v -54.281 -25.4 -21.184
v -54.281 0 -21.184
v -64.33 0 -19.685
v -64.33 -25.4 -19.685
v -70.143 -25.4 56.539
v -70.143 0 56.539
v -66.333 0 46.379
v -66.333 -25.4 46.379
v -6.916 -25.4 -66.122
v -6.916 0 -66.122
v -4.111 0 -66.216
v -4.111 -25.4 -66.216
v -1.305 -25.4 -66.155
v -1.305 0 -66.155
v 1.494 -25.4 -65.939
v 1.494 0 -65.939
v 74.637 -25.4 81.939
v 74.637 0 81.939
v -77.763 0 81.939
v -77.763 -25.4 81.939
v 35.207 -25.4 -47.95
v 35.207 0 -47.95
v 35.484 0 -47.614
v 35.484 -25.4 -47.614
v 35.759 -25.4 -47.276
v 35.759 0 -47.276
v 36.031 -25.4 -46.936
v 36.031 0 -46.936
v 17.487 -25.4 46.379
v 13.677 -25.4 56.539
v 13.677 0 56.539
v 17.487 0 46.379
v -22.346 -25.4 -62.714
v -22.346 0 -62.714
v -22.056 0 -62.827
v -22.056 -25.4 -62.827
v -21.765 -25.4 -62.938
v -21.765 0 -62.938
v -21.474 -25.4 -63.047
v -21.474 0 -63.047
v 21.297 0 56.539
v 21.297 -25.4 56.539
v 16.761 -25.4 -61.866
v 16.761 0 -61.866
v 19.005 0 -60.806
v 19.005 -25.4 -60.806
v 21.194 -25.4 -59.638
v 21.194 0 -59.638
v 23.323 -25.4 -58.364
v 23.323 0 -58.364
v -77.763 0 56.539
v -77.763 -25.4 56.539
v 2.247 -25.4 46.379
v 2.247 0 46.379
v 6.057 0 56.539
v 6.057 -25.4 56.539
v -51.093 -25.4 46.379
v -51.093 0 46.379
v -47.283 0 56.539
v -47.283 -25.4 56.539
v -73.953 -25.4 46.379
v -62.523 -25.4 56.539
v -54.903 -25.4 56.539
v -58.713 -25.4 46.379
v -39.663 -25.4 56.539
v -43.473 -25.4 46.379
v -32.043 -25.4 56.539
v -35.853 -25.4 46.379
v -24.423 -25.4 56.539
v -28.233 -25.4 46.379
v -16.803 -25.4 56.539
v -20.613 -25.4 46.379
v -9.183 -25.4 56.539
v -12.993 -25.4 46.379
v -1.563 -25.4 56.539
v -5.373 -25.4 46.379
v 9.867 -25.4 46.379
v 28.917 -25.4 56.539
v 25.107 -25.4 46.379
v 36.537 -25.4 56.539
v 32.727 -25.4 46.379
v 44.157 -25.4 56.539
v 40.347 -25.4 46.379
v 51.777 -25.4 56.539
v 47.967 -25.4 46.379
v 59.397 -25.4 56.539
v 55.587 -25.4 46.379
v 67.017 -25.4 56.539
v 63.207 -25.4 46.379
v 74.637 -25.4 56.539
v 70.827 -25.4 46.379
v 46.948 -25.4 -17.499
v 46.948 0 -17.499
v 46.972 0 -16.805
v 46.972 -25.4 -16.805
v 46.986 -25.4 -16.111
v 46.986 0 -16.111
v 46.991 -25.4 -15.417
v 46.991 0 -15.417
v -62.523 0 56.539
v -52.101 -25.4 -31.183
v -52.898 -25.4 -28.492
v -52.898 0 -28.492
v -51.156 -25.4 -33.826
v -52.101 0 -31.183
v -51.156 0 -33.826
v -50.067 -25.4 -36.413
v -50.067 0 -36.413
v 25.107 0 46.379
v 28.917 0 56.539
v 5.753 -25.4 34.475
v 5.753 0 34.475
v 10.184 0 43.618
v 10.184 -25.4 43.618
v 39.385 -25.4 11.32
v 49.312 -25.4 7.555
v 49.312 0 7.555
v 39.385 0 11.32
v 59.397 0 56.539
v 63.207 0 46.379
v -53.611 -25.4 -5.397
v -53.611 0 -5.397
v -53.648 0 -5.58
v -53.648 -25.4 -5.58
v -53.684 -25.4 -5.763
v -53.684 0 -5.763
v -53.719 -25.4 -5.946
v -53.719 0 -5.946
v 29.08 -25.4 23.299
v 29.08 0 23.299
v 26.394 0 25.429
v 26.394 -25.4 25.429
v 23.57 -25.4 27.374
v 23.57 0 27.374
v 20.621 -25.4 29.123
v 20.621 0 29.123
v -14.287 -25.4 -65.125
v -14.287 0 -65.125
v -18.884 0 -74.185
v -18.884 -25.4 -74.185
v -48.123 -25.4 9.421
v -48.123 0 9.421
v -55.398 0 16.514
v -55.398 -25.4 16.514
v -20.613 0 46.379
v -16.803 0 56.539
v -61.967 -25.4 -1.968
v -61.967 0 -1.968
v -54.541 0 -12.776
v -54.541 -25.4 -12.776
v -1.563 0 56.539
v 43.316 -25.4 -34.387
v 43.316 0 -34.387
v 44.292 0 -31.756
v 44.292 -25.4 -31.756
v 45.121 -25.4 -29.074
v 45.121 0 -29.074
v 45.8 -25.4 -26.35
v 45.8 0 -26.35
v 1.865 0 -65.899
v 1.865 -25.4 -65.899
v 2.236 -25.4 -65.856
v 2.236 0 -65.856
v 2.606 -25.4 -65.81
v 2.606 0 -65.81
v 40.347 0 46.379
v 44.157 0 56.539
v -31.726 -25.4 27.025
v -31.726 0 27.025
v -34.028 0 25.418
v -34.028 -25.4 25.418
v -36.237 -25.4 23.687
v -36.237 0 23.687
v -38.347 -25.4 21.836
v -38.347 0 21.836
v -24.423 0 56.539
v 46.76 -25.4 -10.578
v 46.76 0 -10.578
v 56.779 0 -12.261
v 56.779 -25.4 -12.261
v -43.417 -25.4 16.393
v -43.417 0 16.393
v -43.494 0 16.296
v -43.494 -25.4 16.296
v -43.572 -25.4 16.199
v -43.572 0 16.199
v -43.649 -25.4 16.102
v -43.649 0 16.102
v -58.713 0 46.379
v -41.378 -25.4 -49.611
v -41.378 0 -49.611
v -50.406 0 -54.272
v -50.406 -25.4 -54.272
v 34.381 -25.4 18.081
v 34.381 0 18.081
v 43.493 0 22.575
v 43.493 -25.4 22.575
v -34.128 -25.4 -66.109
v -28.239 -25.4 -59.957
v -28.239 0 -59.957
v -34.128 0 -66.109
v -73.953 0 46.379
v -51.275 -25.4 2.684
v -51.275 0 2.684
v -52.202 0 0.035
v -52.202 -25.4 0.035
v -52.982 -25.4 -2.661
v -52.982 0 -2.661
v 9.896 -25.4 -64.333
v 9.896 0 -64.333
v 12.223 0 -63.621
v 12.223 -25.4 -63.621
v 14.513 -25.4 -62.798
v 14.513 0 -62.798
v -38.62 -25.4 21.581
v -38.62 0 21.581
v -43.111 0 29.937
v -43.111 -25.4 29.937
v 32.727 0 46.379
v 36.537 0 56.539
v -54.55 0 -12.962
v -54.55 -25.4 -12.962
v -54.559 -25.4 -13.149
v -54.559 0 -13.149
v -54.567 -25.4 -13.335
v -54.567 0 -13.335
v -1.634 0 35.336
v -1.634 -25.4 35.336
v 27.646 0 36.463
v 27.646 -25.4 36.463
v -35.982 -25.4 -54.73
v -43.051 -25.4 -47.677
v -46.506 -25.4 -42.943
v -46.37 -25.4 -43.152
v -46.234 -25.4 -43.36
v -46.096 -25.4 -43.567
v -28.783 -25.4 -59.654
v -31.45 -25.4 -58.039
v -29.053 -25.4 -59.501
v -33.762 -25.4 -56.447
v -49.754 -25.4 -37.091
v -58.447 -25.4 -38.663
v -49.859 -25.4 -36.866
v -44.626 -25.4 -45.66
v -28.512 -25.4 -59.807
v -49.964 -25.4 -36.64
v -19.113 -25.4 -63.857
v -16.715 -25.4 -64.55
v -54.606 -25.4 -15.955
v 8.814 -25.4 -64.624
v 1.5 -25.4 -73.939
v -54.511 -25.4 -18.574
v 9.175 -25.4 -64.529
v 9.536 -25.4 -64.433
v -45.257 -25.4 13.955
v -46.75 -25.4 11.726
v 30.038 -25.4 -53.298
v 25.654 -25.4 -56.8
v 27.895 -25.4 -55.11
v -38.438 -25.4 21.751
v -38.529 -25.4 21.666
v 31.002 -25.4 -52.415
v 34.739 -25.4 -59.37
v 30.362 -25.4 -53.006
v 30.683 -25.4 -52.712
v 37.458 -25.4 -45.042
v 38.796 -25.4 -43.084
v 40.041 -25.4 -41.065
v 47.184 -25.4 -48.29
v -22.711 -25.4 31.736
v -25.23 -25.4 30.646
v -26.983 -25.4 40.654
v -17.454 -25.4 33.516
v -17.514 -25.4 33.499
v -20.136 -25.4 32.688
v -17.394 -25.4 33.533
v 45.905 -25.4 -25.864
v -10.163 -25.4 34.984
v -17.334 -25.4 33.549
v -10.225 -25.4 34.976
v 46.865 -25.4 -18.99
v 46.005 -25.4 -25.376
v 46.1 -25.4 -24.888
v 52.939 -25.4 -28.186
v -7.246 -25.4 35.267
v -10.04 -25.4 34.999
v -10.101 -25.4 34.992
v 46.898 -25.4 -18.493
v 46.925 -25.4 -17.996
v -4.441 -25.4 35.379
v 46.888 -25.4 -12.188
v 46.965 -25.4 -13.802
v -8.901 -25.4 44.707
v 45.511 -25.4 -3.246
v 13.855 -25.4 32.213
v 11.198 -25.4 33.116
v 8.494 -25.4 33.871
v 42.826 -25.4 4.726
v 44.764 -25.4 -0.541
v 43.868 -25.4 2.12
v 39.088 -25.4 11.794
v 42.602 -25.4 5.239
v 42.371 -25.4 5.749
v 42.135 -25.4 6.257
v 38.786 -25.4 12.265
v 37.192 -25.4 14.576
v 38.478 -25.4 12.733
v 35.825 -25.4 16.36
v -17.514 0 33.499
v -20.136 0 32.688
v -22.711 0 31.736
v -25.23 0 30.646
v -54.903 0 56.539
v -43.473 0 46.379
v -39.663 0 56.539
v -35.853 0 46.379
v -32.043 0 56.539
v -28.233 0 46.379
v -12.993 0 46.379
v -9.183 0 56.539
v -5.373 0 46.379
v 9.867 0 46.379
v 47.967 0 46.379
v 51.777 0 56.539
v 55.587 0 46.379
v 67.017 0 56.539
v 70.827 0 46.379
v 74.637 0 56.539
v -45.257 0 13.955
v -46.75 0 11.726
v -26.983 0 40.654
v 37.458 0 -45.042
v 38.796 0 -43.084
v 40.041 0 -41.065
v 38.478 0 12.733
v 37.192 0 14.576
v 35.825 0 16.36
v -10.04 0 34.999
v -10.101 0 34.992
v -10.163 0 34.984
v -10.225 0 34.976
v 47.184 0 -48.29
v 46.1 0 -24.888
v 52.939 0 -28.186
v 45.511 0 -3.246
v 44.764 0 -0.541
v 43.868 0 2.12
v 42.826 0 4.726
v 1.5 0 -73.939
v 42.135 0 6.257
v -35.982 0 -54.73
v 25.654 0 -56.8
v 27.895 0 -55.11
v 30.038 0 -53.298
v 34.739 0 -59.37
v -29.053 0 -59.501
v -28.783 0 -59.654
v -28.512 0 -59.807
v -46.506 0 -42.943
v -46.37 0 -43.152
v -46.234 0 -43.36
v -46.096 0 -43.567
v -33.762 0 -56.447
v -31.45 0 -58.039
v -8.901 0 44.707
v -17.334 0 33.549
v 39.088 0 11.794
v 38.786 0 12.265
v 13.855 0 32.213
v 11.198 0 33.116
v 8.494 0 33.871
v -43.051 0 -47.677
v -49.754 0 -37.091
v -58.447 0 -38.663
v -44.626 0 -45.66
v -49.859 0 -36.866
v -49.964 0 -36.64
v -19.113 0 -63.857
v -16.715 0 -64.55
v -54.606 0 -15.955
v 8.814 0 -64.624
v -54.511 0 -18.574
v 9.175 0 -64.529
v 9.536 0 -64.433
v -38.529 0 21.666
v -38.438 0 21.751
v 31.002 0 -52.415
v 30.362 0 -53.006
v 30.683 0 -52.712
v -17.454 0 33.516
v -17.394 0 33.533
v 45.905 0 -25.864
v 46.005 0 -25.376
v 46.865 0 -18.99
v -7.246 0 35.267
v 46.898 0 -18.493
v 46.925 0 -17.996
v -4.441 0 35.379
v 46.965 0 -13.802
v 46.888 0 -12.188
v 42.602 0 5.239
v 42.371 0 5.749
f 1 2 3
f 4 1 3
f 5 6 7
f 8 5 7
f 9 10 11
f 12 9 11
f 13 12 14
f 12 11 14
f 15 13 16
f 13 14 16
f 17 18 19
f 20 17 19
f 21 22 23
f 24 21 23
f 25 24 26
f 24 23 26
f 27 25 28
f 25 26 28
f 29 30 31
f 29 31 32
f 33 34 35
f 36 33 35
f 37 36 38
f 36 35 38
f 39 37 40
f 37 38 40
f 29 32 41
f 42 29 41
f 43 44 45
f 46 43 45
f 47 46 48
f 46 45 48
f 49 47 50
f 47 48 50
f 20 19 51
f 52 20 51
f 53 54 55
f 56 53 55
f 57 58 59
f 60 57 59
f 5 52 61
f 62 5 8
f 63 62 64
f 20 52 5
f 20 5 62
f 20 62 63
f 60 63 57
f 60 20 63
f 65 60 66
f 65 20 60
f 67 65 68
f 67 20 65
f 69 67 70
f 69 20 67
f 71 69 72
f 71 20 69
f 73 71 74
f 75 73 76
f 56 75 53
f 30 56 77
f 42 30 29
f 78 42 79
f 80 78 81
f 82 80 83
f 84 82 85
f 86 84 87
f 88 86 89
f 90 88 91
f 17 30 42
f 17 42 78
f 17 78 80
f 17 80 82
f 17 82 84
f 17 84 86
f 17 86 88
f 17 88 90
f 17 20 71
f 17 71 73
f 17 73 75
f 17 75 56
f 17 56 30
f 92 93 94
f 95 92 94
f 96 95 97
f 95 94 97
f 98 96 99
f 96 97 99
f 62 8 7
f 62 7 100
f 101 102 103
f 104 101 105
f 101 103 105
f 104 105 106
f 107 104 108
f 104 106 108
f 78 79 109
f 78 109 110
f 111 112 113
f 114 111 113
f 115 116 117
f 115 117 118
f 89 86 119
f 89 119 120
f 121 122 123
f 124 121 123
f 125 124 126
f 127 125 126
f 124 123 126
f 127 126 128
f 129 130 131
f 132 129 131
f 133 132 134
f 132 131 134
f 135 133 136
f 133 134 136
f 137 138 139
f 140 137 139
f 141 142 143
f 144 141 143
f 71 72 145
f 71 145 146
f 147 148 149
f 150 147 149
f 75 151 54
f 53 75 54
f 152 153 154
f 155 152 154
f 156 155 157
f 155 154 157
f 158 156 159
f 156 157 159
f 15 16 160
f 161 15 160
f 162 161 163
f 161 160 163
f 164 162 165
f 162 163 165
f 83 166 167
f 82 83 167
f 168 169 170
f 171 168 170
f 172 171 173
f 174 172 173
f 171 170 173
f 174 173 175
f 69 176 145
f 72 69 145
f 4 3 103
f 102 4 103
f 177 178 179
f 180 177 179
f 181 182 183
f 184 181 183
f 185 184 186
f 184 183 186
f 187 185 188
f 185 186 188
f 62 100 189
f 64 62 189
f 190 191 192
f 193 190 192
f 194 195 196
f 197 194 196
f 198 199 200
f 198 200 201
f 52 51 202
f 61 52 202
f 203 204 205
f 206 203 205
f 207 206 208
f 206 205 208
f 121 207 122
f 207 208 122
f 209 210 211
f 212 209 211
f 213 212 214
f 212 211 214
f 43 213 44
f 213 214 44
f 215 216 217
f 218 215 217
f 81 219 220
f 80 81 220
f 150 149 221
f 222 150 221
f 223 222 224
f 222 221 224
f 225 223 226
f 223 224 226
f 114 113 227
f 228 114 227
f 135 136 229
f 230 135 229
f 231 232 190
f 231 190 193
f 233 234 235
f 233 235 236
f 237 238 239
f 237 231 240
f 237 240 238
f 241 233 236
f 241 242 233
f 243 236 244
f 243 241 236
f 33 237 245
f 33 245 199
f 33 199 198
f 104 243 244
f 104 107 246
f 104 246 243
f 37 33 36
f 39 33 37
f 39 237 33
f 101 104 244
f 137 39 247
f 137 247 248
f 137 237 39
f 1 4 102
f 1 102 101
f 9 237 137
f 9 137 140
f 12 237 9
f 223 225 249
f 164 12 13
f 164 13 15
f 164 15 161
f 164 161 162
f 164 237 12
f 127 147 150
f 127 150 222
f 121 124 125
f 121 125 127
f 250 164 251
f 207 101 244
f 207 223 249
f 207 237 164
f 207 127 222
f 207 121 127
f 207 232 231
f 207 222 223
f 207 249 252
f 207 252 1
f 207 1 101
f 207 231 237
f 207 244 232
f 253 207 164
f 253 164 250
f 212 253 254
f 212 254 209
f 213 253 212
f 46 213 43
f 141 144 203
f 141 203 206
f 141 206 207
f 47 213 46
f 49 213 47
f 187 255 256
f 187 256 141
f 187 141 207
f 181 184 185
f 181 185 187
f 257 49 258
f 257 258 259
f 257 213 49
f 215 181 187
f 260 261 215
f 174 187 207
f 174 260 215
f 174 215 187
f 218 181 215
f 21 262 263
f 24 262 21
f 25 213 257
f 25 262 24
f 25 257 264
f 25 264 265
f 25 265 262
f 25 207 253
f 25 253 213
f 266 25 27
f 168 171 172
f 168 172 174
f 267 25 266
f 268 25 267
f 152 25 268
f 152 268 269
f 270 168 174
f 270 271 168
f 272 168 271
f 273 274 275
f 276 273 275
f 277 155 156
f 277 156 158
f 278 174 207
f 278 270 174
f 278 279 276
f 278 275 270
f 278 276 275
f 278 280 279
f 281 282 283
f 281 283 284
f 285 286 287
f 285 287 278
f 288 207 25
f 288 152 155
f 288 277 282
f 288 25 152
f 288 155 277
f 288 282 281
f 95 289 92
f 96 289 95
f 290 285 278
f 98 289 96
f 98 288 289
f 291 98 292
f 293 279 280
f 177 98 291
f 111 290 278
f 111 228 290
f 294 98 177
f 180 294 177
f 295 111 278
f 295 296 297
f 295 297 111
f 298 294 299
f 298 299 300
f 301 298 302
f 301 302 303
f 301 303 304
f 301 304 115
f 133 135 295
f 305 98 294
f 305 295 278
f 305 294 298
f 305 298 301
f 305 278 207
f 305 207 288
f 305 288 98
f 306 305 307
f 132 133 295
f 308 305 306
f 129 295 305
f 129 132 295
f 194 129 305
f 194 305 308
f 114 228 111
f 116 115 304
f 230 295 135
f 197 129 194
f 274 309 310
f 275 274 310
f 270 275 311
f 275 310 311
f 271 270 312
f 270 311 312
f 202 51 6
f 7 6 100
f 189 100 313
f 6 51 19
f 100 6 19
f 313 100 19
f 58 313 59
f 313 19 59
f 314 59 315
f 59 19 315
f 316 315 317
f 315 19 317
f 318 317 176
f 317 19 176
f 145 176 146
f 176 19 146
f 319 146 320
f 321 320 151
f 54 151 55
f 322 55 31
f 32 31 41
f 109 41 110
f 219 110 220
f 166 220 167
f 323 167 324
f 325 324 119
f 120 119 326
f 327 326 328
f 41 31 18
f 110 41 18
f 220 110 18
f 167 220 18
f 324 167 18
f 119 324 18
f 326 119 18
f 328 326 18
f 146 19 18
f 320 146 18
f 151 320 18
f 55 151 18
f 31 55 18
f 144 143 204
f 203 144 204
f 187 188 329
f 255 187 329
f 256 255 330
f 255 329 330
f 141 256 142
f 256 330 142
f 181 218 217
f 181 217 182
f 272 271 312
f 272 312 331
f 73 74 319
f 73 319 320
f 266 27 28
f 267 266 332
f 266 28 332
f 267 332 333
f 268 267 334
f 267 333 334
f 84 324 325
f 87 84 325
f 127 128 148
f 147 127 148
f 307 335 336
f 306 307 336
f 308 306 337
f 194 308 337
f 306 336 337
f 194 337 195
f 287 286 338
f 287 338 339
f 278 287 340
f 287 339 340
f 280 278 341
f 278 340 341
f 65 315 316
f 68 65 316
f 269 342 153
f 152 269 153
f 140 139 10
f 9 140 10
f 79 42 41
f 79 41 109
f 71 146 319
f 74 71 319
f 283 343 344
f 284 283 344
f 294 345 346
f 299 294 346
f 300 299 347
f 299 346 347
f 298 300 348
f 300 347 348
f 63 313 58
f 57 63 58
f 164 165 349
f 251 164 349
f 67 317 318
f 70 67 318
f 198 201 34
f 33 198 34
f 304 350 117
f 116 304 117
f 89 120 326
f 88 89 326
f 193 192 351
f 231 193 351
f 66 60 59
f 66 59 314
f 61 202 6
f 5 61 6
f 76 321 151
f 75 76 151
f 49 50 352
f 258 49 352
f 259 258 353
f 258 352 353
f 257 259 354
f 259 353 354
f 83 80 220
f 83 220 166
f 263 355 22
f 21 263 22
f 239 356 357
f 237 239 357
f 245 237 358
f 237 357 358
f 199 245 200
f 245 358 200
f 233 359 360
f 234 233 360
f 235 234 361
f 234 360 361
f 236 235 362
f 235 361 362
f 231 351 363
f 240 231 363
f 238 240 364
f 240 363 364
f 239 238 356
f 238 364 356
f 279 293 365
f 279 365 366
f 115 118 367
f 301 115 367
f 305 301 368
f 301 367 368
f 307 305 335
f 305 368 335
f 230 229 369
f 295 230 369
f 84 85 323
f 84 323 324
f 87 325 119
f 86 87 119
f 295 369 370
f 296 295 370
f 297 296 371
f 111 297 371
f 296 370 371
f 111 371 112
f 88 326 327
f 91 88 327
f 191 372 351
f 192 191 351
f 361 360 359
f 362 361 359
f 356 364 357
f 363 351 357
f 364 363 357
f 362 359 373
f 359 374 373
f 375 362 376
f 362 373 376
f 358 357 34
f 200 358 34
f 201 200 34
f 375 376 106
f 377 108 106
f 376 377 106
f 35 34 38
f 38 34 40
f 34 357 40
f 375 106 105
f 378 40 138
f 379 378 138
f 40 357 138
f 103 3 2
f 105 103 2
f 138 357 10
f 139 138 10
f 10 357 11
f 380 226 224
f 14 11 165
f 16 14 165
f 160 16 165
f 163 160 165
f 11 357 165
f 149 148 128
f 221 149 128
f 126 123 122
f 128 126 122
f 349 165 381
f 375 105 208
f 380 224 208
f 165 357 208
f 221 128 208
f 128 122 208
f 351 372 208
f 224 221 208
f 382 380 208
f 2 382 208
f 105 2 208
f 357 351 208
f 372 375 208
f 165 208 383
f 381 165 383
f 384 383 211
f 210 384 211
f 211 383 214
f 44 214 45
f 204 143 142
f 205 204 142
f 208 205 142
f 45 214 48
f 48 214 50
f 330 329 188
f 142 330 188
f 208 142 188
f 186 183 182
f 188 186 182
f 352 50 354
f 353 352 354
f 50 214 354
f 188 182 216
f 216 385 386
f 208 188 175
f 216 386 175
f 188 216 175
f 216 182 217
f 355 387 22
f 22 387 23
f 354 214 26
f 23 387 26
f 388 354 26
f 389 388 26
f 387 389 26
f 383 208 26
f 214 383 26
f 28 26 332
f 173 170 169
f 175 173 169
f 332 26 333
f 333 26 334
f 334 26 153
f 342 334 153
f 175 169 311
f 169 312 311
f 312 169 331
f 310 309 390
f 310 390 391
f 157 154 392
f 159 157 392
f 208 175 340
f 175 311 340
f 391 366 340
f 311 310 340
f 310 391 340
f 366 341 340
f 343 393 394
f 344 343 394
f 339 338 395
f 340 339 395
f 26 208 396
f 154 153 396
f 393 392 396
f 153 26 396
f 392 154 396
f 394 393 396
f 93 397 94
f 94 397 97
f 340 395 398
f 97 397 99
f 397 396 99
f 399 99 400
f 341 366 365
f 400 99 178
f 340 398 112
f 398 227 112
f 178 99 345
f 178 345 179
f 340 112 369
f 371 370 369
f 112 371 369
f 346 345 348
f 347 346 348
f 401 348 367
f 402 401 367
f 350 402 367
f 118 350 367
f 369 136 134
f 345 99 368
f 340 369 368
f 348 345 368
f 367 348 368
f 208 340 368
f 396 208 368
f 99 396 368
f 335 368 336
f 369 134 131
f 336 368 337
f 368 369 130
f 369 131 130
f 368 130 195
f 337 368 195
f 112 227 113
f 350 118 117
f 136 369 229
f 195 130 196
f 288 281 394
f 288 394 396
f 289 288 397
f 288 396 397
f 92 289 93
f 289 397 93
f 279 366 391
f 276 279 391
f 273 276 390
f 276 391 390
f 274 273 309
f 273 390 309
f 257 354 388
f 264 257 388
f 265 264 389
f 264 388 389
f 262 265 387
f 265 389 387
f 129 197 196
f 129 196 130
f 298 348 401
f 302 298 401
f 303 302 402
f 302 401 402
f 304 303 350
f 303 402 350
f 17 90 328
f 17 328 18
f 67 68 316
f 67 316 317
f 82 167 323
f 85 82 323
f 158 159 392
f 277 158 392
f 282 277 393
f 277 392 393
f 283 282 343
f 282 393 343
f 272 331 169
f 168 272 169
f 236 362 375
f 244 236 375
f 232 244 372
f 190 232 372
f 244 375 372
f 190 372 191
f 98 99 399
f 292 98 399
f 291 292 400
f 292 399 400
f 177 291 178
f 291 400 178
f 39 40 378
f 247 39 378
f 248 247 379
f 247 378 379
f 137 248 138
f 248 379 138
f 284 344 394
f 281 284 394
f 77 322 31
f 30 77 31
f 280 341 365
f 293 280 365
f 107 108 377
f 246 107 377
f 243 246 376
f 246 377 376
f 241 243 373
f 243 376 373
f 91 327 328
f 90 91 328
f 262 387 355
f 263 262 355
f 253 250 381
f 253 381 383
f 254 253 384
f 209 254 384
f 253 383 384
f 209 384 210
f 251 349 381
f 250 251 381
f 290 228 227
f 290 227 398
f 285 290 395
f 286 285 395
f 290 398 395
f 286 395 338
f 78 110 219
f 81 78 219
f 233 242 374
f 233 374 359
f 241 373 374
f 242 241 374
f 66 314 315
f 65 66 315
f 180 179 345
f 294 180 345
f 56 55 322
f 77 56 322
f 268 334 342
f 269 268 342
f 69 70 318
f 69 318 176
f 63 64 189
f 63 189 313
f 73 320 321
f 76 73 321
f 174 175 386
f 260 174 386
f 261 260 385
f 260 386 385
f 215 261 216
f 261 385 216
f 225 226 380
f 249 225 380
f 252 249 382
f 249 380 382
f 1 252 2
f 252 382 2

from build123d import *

# Parameters (mm, degrees)
F1_DEPTH = 25.4
F3_DEPTH = 25.4


with BuildPart() as f1:
    # F0 (on Front) → F1 (new body)
    with BuildSketch(Plane.XZ):
        Polygon((74.6370935708, 81.9392564637), (-77.7629064292, 81.9392564637), (-77.7629064292, 56.5392564637), (-70.1429064292, 56.5392564637), (-62.5229064292, 56.5392564637), (-54.9029064292, 56.5392564637), (-47.2829064292, 56.5392564637), (-39.6629064292, 56.5392564637), (-32.0429064292, 56.5392564637), (-24.4229064292, 56.5392564637), (-16.8029064292, 56.5392564637), (-9.1829064292, 56.5392564637), (-1.5629064292, 56.5392564637), (6.0570935708, 56.5392564637), (13.6770935708, 56.5392564637), (21.2970935708, 56.5392564637), (28.9170935708, 56.5392564637), (36.5370935708, 56.5392564637), (44.1570935708, 56.5392564637), (51.7770935708, 56.5392564637), (59.3970935708, 56.5392564637), (67.0170935708, 56.5392564637), (74.6370935708, 56.5392564637), align=None)
        Polygon((-70.1429064292, 56.5392564637), (-77.7629064292, 56.5392564637), (-73.9529064292, 46.3792564637), align=None)
        Polygon((-62.5229064292, 56.5392564637), (-70.1429064292, 56.5392564637), (-66.3329064292, 46.3792564637), align=None)
        Polygon((-54.9029064292, 56.5392564637), (-62.5229064292, 56.5392564637), (-58.7129064292, 46.3792564637), align=None)
        Polygon((-47.2829064292, 56.5392564637), (-54.9029064292, 56.5392564637), (-51.0929064292, 46.3792564637), align=None)
        Polygon((-39.6629064292, 56.5392564637), (-47.2829064292, 56.5392564637), (-43.4729064292, 46.3792564637), align=None)
        Polygon((-32.0429064292, 56.5392564637), (-39.6629064292, 56.5392564637), (-35.8529064292, 46.3792564637), align=None)
        Polygon((-24.4229064292, 56.5392564637), (-32.0429064292, 56.5392564637), (-28.2329064292, 46.3792564637), align=None)
        Polygon((-16.8029064292, 56.5392564637), (-24.4229064292, 56.5392564637), (-20.6129064292, 46.3792564637), align=None)
        Polygon((-9.1829064292, 56.5392564637), (-16.8029064292, 56.5392564637), (-12.9929064292, 46.3792564637), align=None)
        Polygon((-1.5629064292, 56.5392564637), (-9.1829064292, 56.5392564637), (-5.3729064292, 46.3792564637), align=None)
        Polygon((2.2470935708, 46.3792564637), (6.0570935708, 56.5392564637), (-1.5629064292, 56.5392564637), align=None)
        Polygon((9.8670935708, 46.3792564637), (13.6770935708, 56.5392564637), (6.0570935708, 56.5392564637), align=None)
        Polygon((17.4870935708, 46.3792564637), (21.2970935708, 56.5392564637), (13.6770935708, 56.5392564637), align=None)
        Polygon((25.1070935708, 46.3792564637), (28.9170935708, 56.5392564637), (21.2970935708, 56.5392564637), align=None)
        Polygon((32.7270935708, 46.3792564637), (36.5370935708, 56.5392564637), (28.9170935708, 56.5392564637), align=None)
        Polygon((40.3470935708, 46.3792564637), (44.1570935708, 56.5392564637), (36.5370935708, 56.5392564637), align=None)
        Polygon((47.9670935708, 46.3792564637), (51.7770935708, 56.5392564637), (44.1570935708, 56.5392564637), align=None)
        Polygon((55.5870935708, 46.3792564637), (59.3970935708, 56.5392564637), (51.7770935708, 56.5392564637), align=None)
        Polygon((63.2070935708, 46.3792564637), (67.0170935708, 56.5392564637), (59.3970935708, 56.5392564637), align=None)
        Polygon((70.8270935708, 46.3792564637), (74.6370935708, 56.5392564637), (67.0170935708, 56.5392564637), align=None)
    extrude(amount=F1_DEPTH)


with BuildPart() as f3:
    # F2 (on Front) → F3 (new body)
    with BuildSketch(Plane.XZ):
        with BuildLine():
            ThreePointArc((46.9480534398, -17.4986982738), (46.9800554936, -16.4580587956), (46.9907243386, -15.4169820306))
            ThreePointArc((46.9907243386, -15.4169820306), (46.9329445852, -12.994775505), (46.7597367618, -10.578078999))
            ThreePointArc((46.7597367618, -10.578078999), (46.2698358354, -6.8892278306), (45.5112121118, -3.2461362992))
            ThreePointArc((45.5112121118, -3.2461362992), (44.3341573591, 0.7956629421), (42.826495232, 4.7261277885))
            ThreePointArc((42.826495232, 4.7261277885), (42.4870752898, 5.494447586), (42.1349983875, 6.2570504075))
            ThreePointArc((42.1349983875, 6.2570504075), (40.8320710006, 8.8274022307), (39.3854907226, 11.3197372341))
            ThreePointArc((39.3854907226, 11.3197372341), (38.9375227741, 12.0302623396), (38.4778682778, 12.7332836426))
            ThreePointArc((38.4778682778, 12.7332836426), (36.5181991741, 15.4753272615), (34.3810221384, 18.0813933624))
            ThreePointArc((34.3810221384, 18.0813933624), (31.8263564811, 20.7871851578), (29.0804712423, 23.298706632))
            ThreePointArc((29.0804712423, 23.298706632), (24.9981834999, 26.4252250895), (20.6207462136, 29.1230452617))
            ThreePointArc((20.6207462136, 29.1230452617), (17.2947104492, 30.791910731), (13.8554314182, 32.2128208642))
            ThreePointArc((13.8554314182, 32.2128208642), (9.8511734607, 33.5118655932), (5.7531073775, 34.474909401))
            ThreePointArc((5.7531073775, 34.474909401), (2.0751855008, 35.0410511934), (-1.634312193, 35.3364369076))
            ThreePointArc((-1.634312193, 35.3364369076), (-5.8440111349, 35.34225212), (-10.0397372769, 34.999496903))
            ThreePointArc((-10.0397372769, 34.999496903), (-10.1323512948, 34.9879652914), (-10.2249439707, 34.97626355))
            ThreePointArc((-10.2249439707, 34.97626355), (-13.8052102972, 34.3898577684), (-17.334493814, 33.5494194497))
            ThreePointArc((-17.334493814, 33.5494194497), (-17.4244314566, 33.5244884487), (-17.5143231445, 33.4993922575))
            ThreePointArc((-17.5143231445, 33.4993922575), (-21.4298900664, 32.2291505301), (-25.2297552809, 30.6460514439))
            ThreePointArc((-25.2297552809, 30.6460514439), (-28.5442644734, 28.9544088477), (-31.726046563, 27.0246708876))
            ThreePointArc((-31.726046563, 27.0246708876), (-35.1442341994, 24.5675196347), (-38.3472404972, 21.835789477))
            ThreePointArc((-38.3472404972, 21.835789477), (-38.4838877808, 21.7086327706), (-38.6200669213, 21.58097483))
            ThreePointArc((-38.6200669213, 21.58097483), (-41.1085851227, 19.0707188744), (-43.4165195955, 16.3934915268))
            ThreePointArc((-43.4165195955, 16.3934915268), (-43.5331356474, 16.2477451562), (-43.649215386, 16.1015712791))
            ThreePointArc((-43.649215386, 16.1015712791), (-46.0184856872, 12.8500055874), (-48.1230141454, 9.4211455471))
            ThreePointArc((-48.1230141454, 9.4211455471), (-49.8223615512, 6.1105799981), (-51.2748043139, 2.6844982884))
            ThreePointArc((-51.2748043139, 2.6844982884), (-52.6105766053, -1.307657944), (-53.6112238557, -5.3967047862))
            ThreePointArc((-53.6112238557, -5.3967047862), (-53.6656945721, -5.6713423183), (-53.7186507859, -5.9462758964))
            ThreePointArc((-53.7186507859, -5.9462758964), (-54.2453465852, -9.3471591532), (-54.5405744779, -12.7758988463))
            ThreePointArc((-54.5405744779, -12.7758988463), (-54.5543603691, -13.0555464498), (-54.5666047625, -13.3352657873))
            ThreePointArc((-54.5666047625, -13.3352657873), (-54.57564353, -17.2651956068), (-54.2808593624, -21.1840643696))
            ThreePointArc((-54.2808593624, -21.1840643696), (-53.723273767, -24.8632931154), (-52.8978513671, -28.4918332794))
            ThreePointArc((-52.8978513671, -28.4918332794), (-51.6467439509, -32.511326933), (-50.0671302611, -36.4134314407))
            ThreePointArc((-50.0671302611, -36.4134314407), (-49.9115848391, -36.7527990639), (-49.7535497102, -37.0910144686))
            ThreePointArc((-49.7535497102, -37.0910144686), (-48.2260344731, -40.0704105276), (-46.5055762176, -42.9427139702))
            ThreePointArc((-46.5055762176, -42.9427139702), (-46.3021453005, -43.2557325383), (-46.0964196005, -43.5672477037))
            ThreePointArc((-46.0964196005, -43.5672477037), (-43.8512780464, -46.678428654), (-41.3777347859, -49.6112926539))
            ThreePointArc((-41.3777347859, -49.6112926539), (-38.7737925456, -52.2696964361), (-35.982231905, -54.7303498148))
            ThreePointArc((-35.982231905, -54.7303498148), (-32.6167348226, -57.2591891506), (-29.0534130767, -59.5006924705))
            ThreePointArc((-29.0534130767, -59.5006924705), (-28.647403239, -59.7307205146), (-28.2392975363, -59.9570093228))
            ThreePointArc((-28.2392975363, -59.9570093228), (-25.33683769, -61.4300679204), (-22.3460017993, -62.7142312538))
            ThreePointArc((-22.3460017993, -62.7142312538), (-21.9107559803, -62.8825106831), (-21.4739827409, -63.0467849253))
            ThreePointArc((-21.4739827409, -63.0467849253), (-17.9185997479, -64.2182829745), (-14.2866015905, -65.1247846512))
            ThreePointArc((-14.2866015905, -65.1247846512), (-10.6197009017, -65.758397466), (-6.9162557044, -66.1218799696))
            ThreePointArc((-6.9162557044, -66.1218799696), (-2.7073740148, -66.2050299627), (1.4939407692, -65.9394116583))
            ThreePointArc((1.4939407692, -65.9394116583), (2.0505227154, -65.8778853418), (2.6063926479, -65.8102276111))
            ThreePointArc((2.6063926479, -65.8102276111), (5.7287208626, -65.3135412537), (8.8141054153, -64.6235898205))
            ThreePointArc((8.8141054153, -64.6235898205), (9.3557384472, -64.4814539376), (9.8957718218, -64.3333563186))
            ThreePointArc((9.8957718218, -64.3333563186), (13.3729267983, -63.2229640687), (16.7613718388, -61.8657544732))
            ThreePointArc((16.7613718388, -61.8657544732), (20.1063985982, -60.2352877182), (23.3230946686, -58.3643274698))
            ThreePointArc((23.3230946686, -58.3643274698), (26.7858454227, -55.9703859056), (30.0384954006, -53.2979587093))
            ThreePointArc((30.0384954006, -53.2979587093), (30.5228445182, -52.8595450301), (31.0015155986, -52.4149388911))
            ThreePointArc((31.0015155986, -52.4149388911), (33.1716625099, -50.245852411), (35.2068986733, -47.9497061755))
            ThreePointArc((35.2068986733, -47.9497061755), (35.6220420538, -47.4452692661), (36.0306640633, -46.9355353402))
            ThreePointArc((36.0306640633, -46.9355353402), (38.1384982401, -44.0705030134), (40.0406869086, -41.0649991589))
            ThreePointArc((40.0406869086, -41.0649991589), (41.8005654496, -37.7862107575), (43.3157031451, -34.3873898408))
            ThreePointArc((43.3157031451, -34.3873898408), (44.7245893306, -30.4204465951), (45.8001869934, -26.3504725576))
            ThreePointArc((45.8001869934, -26.3504725576), (45.9555181469, -25.6201823726), (46.1000994632, -24.8876881647))
            ThreePointArc((46.1000994632, -24.8876881647), (46.5689110749, -21.9498451979), (46.8649428721, -18.9895967623))
            ThreePointArc((46.8649428721, -18.9895967623), (46.9119763782, -18.2444529031), (46.9480534398, -17.4986982738))
        make_face()
        with BuildLine():
            ThreePointArc((-51.2748043139, 2.6844982884), (-49.8223615512, 6.1105799981), (-48.1230141454, 9.4211455471))
            Line((-48.1230141454, 9.4211455471), (-55.3976447468, 16.5137719727))
            Line((-55.3976447468, 16.5137719727), (-51.2748043139, 2.6844982884))
        make_face()
        with BuildLine():
            ThreePointArc((-43.4165195955, 16.3934915268), (-41.1085851227, 19.0707188744), (-38.6200669213, 21.58097483))
            Line((-38.6200669213, 21.58097483), (-43.1105487158, 29.9374336224))
            Line((-43.1105487158, 29.9374336224), (-43.4165195955, 16.3934915268))
        make_face()
        with BuildLine():
            ThreePointArc((-31.726046563, 27.0246708876), (-28.5442644734, 28.9544088477), (-25.2297552809, 30.6460514439))
            Line((-25.2297552809, 30.6460514439), (-26.9828973096, 40.6536532059))
            Line((-26.9828973096, 40.6536532059), (-31.726046563, 27.0246708876))
        make_face()
        with BuildLine():
            ThreePointArc((-17.334493814, 33.5494194497), (-13.8052102972, 34.3898577684), (-10.2249439707, 34.97626355))
            Line((-10.2249439707, 34.97626355), (-8.900993754, 44.7071336272))
            Line((-8.900993754, 44.7071336272), (-17.334493814, 33.5494194497))
        make_face()
        with BuildLine():
            ThreePointArc((-1.634312193, 35.3364369076), (2.0751855008, 35.0410511934), (5.7531073775, 34.474909401))
            Line((5.7531073775, 34.474909401), (10.1835410763, 43.6180410986))
            Line((10.1835410763, 43.6180410986), (-1.634312193, 35.3364369076))
        make_face()
        with BuildLine():
            ThreePointArc((13.8554314182, 32.2128208642), (17.2947104492, 30.791910731), (20.6207462136, 29.1230452617))
            Line((20.6207462136, 29.1230452617), (27.6462499924, 36.4625204918))
            Line((27.6462499924, 36.4625204918), (13.8554314182, 32.2128208642))
        make_face()
        with BuildLine():
            ThreePointArc((29.0804712423, 23.298706632), (31.8263564811, 20.7871851578), (34.3810221384, 18.0813933624))
            Line((34.3810221384, 18.0813933624), (43.4930845668, 22.5753802672))
            Line((43.4930845668, 22.5753802672), (29.0804712423, 23.298706632))
        make_face()
        with BuildLine():
            ThreePointArc((39.3854907226, 11.3197372341), (40.8320710006, 8.8274022307), (42.1349983875, 6.2570504075))
            Line((42.1349983875, 6.2570504075), (49.3124478734, 7.5552162406))
            Line((49.3124478734, 7.5552162406), (39.3854907226, 11.3197372341))
        make_face()
        with BuildLine():
            ThreePointArc((45.5112121118, -3.2461362992), (46.2698358354, -6.8892278306), (46.7597367618, -10.578078999))
            Line((46.7597367618, -10.578078999), (56.7793024902, -12.2614989151))
            Line((56.7793024902, -12.2614989151), (45.5112121118, -3.2461362992))
        make_face()
        with BuildLine():
            Line((52.9386171528, -28.1858887303), (46.8649428721, -18.9895967623))
            ThreePointArc((46.8649428721, -18.9895967623), (46.5689110749, -21.9498451979), (46.1000994632, -24.8876881647))
            Line((46.1000994632, -24.8876881647), (52.9386171528, -28.1858887303))
        make_face()
        with BuildLine():
            Line((47.1837922551, -48.2900698166), (43.3157031451, -34.3873898408))
            ThreePointArc((43.3157031451, -34.3873898408), (41.8005654496, -37.7862107575), (40.0406869086, -41.0649991589))
            Line((40.0406869086, -41.0649991589), (47.1837922551, -48.2900698166))
        make_face()
        with BuildLine():
            Line((34.7388771247, -59.3698958456), (35.2068986733, -47.9497061755))
            ThreePointArc((35.2068986733, -47.9497061755), (33.1716625099, -50.245852411), (31.0015155986, -52.4149388911))
            Line((31.0015155986, -52.4149388911), (34.7388771247, -59.3698958456))
        make_face()
        with BuildLine():
            Line((1.5004291482, -73.9389223239), (8.8141054153, -64.6235898205))
            ThreePointArc((8.8141054153, -64.6235898205), (5.7287208626, -65.3135412537), (2.6063926479, -65.8102276111))
            Line((2.6063926479, -65.8102276111), (1.5004291482, -73.9389223239))
        make_face()
        with BuildLine():
            Line((-18.8842547484, -74.184982521), (-6.9162557044, -66.1218799696))
            ThreePointArc((-6.9162557044, -66.1218799696), (-10.6197009017, -65.758397466), (-14.2866015905, -65.1247846512))
            Line((-14.2866015905, -65.1247846512), (-18.8842547484, -74.184982521))
        make_face()
        with BuildLine():
            Line((-34.1284239582, -66.1093222189), (-22.3460017993, -62.7142312538))
            ThreePointArc((-22.3460017993, -62.7142312538), (-25.33683769, -61.4300679204), (-28.2392975363, -59.9570093228))
            Line((-28.2392975363, -59.9570093228), (-34.1284239582, -66.1093222189))
        make_face()
        with BuildLine():
            Line((-50.4057011031, -54.2719175237), (-35.982231905, -54.7303498148))
            ThreePointArc((-35.982231905, -54.7303498148), (-38.7737925456, -52.2696964361), (-41.3777347859, -49.6112926539))
            Line((-41.3777347859, -49.6112926539), (-50.4057011031, -54.2719175237))
        make_face()
        with BuildLine():
            Line((-58.4472142791, -38.6634140139), (-46.5055762176, -42.9427139702))
            ThreePointArc((-46.5055762176, -42.9427139702), (-48.2260344731, -40.0704105276), (-49.7535497102, -37.0910144686))
            Line((-49.7535497102, -37.0910144686), (-58.4472142791, -38.6634140139))
        make_face()
        with BuildLine():
            ThreePointArc((-52.8978513671, -28.4918332794), (-53.723273767, -24.8632931154), (-54.2808593624, -21.1840643696))
            Line((-54.2808593624, -21.1840643696), (-64.3296600658, -19.6849965176))
            Line((-64.3296600658, -19.6849965176), (-52.8978513671, -28.4918332794))
        make_face()
        with BuildLine():
            ThreePointArc((-54.5405744779, -12.7758988463), (-54.2453465852, -9.3471591532), (-53.7186507859, -5.9462758964))
            Line((-53.7186507859, -5.9462758964), (-61.9673876205, -1.967930043))
            Line((-61.9673876205, -1.967930043), (-54.5405744779, -12.7758988463))
        make_face()
    extrude(amount=F3_DEPTH)


solid = Compound([f1.part, f3.part])
